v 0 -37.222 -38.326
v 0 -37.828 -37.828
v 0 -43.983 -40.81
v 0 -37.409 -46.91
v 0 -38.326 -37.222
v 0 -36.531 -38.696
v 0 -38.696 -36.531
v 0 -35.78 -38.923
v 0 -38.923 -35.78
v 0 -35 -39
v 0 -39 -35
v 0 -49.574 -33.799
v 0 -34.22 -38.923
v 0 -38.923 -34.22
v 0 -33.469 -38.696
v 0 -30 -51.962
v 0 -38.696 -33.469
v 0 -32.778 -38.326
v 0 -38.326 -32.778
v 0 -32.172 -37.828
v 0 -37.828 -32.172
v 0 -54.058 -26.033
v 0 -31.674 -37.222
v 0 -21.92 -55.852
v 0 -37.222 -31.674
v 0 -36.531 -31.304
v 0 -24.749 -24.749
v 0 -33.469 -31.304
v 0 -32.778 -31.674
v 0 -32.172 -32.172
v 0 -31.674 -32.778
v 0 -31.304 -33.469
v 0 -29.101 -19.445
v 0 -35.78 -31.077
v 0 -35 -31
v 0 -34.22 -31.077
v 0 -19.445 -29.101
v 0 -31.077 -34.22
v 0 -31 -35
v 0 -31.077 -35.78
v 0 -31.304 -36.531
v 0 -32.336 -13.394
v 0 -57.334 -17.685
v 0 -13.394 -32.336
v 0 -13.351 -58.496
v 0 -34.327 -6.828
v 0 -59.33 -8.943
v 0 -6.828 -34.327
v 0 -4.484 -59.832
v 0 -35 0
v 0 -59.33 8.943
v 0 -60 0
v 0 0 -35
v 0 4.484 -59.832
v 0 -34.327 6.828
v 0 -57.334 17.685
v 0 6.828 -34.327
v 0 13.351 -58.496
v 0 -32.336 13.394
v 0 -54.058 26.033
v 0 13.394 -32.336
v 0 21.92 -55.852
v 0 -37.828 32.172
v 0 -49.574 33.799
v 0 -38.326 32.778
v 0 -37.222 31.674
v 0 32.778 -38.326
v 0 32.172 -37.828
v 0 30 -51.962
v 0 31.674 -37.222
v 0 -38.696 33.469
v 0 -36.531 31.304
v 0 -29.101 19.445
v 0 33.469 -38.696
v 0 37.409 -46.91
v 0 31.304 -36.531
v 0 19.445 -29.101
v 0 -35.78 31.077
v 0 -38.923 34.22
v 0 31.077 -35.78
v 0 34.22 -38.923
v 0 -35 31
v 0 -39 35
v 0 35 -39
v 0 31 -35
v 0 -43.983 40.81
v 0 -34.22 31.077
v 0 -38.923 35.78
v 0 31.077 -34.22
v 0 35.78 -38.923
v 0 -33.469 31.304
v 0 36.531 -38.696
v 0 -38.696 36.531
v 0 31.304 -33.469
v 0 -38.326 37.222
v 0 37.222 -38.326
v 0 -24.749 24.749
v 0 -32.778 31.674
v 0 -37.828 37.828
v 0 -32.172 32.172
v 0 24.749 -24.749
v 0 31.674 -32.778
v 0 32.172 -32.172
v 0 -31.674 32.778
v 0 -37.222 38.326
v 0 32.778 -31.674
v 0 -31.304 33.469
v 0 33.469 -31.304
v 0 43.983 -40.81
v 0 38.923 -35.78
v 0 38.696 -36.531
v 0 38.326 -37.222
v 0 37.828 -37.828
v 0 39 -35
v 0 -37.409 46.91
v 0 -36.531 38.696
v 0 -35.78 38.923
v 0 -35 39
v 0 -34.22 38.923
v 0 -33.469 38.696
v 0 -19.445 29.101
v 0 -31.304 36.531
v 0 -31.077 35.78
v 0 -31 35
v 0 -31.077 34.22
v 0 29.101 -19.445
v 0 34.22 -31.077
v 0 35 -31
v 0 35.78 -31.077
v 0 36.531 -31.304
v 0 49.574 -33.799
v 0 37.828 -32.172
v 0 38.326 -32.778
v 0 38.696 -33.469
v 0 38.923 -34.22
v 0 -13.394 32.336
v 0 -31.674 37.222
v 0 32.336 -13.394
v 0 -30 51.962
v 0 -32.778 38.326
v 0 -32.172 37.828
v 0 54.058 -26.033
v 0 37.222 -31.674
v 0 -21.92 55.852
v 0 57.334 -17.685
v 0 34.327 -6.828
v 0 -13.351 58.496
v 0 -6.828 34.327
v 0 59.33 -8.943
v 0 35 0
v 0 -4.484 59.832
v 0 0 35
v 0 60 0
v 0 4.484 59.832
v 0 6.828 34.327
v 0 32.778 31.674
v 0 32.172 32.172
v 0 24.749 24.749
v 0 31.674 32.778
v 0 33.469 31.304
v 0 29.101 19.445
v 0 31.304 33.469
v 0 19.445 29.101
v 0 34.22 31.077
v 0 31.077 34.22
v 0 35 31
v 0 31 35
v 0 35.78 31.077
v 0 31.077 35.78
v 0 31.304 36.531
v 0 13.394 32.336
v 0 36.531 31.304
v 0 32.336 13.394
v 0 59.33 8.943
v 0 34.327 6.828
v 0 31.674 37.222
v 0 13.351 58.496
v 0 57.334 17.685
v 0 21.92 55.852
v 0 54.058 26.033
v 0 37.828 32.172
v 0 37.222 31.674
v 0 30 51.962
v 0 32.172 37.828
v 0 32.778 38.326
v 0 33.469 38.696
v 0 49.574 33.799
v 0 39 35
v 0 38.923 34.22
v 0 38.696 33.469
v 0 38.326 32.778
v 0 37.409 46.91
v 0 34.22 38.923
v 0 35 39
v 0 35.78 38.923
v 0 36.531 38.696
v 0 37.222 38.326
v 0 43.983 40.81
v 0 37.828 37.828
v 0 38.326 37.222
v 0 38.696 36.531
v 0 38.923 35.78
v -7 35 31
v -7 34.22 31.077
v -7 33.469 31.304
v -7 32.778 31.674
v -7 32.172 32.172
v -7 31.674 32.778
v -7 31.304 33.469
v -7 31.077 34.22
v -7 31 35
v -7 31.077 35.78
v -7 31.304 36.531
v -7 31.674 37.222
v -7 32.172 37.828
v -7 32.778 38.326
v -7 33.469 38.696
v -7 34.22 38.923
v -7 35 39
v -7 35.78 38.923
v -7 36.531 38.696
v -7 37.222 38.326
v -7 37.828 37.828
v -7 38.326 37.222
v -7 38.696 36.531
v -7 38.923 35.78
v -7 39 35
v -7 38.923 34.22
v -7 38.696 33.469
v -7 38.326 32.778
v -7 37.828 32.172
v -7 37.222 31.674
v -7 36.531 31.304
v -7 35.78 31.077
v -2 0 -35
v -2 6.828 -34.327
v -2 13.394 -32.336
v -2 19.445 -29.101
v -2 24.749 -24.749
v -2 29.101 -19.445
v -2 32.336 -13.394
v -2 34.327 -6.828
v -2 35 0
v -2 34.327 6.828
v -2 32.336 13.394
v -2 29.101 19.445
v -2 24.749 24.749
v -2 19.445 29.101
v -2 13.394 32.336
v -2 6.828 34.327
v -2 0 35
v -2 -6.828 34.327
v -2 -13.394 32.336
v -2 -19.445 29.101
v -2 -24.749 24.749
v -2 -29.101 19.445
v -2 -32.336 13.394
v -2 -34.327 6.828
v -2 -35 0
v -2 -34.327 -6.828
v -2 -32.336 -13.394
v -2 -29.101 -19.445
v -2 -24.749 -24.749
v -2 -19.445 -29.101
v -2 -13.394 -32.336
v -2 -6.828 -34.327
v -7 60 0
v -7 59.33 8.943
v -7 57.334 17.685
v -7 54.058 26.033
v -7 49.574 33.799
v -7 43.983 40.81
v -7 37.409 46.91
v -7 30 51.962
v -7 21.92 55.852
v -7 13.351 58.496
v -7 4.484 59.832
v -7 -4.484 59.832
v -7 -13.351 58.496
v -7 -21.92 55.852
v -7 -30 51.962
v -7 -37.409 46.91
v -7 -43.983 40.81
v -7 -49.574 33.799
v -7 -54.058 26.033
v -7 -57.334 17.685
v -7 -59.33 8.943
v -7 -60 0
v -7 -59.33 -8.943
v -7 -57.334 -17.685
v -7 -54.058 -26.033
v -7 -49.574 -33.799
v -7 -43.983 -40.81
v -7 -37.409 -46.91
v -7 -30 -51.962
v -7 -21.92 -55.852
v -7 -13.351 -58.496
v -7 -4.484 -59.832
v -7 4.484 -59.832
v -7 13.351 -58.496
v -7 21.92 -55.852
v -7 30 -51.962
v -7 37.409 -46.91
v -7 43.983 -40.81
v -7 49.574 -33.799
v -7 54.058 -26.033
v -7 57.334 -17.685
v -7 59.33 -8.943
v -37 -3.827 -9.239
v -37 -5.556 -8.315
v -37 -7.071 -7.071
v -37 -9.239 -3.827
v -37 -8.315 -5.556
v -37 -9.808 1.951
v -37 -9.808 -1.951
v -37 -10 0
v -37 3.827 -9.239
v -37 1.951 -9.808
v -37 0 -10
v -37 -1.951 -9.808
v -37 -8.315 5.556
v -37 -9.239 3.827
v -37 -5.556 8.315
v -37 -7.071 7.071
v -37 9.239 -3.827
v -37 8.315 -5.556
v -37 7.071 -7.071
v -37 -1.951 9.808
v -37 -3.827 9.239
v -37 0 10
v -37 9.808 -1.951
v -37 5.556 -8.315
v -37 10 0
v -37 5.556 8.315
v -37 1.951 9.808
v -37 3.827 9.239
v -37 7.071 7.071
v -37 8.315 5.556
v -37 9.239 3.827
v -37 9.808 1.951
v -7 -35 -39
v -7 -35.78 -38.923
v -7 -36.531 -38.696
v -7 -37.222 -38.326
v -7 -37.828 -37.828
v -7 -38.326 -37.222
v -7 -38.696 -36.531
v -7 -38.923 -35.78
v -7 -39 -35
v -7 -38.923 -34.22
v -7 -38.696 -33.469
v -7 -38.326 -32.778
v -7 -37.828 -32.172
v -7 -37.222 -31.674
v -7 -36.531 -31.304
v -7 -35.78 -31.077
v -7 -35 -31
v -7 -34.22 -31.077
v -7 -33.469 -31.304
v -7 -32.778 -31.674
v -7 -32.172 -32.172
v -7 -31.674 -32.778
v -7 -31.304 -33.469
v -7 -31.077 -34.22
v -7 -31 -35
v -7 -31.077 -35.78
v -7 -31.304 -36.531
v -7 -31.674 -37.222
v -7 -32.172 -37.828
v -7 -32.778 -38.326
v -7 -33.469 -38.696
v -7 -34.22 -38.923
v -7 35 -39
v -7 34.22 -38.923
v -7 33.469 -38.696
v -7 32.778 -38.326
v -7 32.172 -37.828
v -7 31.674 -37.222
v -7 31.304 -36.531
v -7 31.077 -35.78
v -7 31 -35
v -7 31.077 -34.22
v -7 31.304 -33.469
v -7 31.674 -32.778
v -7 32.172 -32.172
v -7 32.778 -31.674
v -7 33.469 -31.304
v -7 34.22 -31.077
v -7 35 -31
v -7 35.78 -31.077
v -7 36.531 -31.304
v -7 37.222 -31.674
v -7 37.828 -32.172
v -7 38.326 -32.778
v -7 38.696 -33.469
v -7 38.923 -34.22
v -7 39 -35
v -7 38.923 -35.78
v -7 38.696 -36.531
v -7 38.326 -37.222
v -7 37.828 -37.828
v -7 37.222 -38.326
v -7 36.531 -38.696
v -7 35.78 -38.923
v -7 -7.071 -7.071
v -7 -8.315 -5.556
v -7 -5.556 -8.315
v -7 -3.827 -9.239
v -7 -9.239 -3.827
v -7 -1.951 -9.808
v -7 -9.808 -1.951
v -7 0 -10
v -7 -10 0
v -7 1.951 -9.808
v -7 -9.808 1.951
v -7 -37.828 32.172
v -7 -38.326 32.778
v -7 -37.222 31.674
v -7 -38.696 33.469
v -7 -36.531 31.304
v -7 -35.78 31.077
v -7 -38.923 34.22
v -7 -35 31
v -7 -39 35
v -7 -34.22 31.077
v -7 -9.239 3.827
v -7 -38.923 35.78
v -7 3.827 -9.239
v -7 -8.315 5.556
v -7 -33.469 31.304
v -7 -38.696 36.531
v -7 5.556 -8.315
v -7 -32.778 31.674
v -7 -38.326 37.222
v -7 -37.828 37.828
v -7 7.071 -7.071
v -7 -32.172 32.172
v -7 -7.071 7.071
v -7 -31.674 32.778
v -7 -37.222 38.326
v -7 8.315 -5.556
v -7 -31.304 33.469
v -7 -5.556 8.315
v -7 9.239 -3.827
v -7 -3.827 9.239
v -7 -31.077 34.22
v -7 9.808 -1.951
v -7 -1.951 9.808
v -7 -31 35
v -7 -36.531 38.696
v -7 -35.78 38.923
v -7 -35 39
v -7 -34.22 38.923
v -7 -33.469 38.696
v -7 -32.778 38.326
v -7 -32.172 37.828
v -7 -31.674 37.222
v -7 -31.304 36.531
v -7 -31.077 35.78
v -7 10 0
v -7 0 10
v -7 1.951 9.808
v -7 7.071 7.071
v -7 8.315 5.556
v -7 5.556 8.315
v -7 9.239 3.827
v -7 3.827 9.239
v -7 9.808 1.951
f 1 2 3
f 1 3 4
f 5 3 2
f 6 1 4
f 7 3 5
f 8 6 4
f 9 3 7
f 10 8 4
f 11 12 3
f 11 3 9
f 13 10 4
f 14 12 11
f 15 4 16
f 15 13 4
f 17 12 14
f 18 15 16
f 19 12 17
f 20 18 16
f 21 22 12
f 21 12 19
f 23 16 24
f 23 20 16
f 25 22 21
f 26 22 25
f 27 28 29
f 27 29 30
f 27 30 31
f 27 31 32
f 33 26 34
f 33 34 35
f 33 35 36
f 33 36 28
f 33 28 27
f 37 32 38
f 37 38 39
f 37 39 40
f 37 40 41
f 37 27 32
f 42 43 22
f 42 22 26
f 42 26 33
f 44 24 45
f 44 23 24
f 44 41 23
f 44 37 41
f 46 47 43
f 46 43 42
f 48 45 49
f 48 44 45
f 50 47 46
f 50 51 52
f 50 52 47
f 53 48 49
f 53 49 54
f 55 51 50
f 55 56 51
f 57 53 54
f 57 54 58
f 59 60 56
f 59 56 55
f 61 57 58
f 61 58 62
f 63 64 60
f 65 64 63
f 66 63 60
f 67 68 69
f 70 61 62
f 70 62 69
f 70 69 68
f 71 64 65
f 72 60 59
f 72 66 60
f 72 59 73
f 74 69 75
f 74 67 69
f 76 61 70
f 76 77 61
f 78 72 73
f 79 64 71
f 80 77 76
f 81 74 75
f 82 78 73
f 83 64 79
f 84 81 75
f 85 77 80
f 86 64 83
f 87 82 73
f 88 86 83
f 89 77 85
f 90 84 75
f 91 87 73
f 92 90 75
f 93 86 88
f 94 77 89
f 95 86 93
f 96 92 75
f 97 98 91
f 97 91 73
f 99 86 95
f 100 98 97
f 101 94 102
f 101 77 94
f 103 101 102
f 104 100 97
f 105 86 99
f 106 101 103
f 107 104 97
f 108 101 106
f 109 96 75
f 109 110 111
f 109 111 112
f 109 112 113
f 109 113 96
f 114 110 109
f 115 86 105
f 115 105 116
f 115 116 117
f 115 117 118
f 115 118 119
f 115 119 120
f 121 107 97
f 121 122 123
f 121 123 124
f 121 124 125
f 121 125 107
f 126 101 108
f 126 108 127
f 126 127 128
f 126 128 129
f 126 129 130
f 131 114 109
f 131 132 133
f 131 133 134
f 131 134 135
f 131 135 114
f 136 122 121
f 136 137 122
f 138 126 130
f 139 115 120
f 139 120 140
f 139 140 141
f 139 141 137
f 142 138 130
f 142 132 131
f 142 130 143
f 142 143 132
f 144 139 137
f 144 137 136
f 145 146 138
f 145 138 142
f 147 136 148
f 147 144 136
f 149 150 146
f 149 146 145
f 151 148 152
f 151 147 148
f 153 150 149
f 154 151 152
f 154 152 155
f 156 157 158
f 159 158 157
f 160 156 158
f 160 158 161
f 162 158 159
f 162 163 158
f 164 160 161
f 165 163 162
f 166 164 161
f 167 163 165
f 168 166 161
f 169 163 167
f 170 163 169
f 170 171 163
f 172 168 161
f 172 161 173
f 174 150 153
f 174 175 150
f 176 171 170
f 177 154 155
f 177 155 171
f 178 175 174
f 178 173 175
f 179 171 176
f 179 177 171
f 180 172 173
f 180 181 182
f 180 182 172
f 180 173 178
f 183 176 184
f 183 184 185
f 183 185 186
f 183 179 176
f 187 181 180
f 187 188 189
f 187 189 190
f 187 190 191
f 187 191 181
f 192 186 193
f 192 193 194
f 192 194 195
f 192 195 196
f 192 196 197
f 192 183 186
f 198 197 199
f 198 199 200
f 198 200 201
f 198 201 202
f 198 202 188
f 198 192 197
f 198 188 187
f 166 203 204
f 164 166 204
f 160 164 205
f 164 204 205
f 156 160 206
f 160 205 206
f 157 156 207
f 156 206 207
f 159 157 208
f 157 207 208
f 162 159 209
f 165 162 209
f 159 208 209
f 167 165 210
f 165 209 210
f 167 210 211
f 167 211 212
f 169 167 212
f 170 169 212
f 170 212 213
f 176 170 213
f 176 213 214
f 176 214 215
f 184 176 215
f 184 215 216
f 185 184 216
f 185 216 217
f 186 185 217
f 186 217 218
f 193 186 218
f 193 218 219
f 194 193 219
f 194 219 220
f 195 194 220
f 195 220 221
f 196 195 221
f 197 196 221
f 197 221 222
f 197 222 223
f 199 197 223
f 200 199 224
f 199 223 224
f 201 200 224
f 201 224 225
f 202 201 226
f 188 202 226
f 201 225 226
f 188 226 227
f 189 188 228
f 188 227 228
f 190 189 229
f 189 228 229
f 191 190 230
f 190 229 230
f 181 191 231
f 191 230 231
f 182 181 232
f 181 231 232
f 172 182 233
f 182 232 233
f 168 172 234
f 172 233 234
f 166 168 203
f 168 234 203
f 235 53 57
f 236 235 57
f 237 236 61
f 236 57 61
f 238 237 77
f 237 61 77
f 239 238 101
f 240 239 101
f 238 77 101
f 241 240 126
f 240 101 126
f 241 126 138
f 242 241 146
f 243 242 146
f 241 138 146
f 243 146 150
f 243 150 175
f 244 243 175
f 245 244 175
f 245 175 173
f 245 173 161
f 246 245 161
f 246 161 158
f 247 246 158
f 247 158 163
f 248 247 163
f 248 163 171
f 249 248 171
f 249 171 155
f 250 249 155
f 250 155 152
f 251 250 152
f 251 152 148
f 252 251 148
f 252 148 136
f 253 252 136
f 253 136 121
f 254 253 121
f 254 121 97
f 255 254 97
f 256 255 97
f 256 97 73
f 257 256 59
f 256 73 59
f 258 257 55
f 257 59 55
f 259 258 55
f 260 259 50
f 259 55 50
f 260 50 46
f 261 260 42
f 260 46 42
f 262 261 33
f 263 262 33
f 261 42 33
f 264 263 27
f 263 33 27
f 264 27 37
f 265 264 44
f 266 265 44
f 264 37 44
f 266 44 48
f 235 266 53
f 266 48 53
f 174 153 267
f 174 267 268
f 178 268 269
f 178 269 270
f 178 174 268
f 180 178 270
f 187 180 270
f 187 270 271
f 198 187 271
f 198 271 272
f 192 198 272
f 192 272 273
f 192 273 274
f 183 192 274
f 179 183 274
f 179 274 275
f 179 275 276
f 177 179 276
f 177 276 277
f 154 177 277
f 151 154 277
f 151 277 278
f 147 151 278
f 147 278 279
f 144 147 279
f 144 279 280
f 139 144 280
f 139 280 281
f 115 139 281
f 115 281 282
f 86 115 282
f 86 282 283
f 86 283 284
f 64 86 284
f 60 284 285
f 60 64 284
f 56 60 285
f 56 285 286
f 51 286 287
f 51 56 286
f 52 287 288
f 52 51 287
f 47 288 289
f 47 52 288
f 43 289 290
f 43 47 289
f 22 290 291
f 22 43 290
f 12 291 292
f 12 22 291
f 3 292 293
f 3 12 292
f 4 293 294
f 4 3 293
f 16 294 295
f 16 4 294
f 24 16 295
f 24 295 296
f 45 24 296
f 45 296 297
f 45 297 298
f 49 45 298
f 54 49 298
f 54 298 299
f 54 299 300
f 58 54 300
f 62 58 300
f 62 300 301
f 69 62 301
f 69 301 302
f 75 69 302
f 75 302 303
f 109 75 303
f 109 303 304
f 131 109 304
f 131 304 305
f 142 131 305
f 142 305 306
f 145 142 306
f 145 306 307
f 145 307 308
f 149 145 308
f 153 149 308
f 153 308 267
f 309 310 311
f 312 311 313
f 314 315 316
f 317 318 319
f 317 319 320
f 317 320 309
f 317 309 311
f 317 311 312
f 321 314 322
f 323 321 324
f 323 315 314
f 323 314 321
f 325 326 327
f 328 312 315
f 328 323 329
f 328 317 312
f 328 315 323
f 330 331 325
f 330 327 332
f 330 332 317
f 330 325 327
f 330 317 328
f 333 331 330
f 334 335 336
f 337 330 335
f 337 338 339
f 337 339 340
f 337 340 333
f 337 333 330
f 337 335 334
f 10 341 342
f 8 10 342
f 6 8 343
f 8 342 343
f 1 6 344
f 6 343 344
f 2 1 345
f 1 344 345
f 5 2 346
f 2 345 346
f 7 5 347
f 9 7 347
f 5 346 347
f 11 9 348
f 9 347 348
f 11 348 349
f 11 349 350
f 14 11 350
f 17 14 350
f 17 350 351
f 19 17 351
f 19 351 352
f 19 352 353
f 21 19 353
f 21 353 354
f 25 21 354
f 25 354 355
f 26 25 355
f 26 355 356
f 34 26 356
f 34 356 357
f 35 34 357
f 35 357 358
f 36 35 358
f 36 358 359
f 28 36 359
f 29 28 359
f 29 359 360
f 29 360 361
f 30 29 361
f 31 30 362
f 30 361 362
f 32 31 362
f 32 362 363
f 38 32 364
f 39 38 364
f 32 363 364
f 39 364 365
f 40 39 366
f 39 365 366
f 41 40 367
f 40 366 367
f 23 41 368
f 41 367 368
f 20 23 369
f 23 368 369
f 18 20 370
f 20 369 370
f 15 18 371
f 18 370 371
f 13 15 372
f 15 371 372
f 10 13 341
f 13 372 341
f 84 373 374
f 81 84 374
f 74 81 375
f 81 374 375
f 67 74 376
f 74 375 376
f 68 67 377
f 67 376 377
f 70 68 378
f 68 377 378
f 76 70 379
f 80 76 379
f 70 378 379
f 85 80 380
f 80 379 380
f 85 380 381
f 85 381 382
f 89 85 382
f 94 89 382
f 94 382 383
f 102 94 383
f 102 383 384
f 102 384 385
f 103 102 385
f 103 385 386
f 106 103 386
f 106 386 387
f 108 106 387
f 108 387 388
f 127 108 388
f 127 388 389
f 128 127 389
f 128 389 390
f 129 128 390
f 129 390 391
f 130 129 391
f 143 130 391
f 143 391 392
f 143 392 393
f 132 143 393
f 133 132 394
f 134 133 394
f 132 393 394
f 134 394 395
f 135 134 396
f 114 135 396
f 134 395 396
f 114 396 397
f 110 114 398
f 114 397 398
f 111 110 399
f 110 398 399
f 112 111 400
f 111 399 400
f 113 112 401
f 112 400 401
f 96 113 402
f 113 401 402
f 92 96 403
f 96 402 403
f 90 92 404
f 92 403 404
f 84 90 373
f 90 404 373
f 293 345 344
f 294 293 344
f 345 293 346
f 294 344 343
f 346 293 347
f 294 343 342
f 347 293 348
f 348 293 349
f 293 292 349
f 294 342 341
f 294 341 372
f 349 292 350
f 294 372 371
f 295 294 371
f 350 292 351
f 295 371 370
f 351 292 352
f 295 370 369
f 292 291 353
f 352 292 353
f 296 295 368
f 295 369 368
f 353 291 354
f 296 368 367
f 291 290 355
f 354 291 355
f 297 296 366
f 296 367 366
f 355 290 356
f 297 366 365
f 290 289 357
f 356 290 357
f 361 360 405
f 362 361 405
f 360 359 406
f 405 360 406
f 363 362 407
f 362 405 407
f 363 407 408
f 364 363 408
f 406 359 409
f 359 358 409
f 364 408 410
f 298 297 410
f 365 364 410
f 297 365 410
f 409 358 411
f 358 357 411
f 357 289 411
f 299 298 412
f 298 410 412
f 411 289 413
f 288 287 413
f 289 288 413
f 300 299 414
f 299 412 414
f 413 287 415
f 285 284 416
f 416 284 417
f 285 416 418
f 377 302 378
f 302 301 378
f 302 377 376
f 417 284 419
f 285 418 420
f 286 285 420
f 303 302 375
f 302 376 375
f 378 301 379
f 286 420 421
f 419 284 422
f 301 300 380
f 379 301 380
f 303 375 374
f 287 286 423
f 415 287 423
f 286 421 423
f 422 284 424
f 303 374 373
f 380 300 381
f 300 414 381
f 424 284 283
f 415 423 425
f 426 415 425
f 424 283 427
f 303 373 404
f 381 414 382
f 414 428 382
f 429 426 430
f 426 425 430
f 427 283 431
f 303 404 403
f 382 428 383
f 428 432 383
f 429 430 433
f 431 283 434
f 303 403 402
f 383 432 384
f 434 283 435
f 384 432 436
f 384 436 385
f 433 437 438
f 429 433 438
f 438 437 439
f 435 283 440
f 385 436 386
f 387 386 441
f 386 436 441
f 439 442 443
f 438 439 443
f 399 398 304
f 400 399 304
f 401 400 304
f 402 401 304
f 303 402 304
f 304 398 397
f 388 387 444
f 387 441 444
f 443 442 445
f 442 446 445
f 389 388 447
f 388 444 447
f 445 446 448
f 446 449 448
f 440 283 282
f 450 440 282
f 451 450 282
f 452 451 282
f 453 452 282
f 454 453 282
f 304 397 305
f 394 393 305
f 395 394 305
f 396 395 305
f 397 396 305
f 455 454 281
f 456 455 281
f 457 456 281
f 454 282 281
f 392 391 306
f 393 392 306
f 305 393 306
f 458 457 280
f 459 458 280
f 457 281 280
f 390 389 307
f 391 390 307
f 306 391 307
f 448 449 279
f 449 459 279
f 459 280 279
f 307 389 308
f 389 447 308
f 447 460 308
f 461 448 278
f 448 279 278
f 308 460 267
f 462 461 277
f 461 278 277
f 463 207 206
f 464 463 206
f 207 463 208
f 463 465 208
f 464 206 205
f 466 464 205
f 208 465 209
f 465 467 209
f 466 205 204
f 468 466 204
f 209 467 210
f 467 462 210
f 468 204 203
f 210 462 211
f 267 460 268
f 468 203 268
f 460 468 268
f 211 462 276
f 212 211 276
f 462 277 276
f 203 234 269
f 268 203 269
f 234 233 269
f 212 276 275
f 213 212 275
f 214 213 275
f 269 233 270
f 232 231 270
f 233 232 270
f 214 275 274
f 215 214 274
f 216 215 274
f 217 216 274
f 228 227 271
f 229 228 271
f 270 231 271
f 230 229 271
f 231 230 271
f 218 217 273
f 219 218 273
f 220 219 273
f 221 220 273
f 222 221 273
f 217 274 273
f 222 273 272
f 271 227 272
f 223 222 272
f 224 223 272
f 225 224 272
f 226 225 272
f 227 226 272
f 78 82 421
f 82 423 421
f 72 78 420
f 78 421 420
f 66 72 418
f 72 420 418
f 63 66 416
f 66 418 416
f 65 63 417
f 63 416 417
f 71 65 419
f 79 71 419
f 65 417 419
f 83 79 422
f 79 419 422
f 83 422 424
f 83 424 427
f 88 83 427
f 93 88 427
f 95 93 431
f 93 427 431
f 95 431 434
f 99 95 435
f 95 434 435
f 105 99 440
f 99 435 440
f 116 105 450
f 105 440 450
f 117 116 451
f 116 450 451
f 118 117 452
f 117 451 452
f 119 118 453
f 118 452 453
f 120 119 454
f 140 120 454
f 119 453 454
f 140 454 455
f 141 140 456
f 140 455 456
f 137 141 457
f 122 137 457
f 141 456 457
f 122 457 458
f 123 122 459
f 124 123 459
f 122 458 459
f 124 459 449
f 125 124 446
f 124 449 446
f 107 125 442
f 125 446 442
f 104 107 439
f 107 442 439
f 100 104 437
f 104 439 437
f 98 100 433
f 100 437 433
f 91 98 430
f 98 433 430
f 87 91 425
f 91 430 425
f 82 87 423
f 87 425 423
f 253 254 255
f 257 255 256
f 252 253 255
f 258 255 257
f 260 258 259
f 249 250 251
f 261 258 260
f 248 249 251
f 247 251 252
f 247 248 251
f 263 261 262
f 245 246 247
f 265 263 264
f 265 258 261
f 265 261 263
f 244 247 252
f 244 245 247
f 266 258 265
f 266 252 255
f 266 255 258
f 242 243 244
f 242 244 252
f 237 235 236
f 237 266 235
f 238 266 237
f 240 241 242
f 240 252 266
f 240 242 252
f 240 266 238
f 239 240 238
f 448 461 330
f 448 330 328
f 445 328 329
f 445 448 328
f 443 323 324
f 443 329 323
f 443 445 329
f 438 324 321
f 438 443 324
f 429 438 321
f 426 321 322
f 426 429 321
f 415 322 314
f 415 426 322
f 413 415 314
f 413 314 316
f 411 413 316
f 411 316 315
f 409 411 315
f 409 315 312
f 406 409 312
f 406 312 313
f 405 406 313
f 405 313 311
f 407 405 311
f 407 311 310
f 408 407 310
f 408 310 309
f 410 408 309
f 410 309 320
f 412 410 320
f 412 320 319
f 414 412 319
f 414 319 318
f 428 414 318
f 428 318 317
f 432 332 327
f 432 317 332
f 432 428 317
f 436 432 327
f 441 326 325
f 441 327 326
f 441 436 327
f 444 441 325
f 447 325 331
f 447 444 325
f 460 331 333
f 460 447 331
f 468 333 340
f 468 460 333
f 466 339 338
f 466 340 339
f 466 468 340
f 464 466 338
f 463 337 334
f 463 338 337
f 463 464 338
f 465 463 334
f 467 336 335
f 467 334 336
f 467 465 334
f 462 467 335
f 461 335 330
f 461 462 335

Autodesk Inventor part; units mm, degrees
ref_plane "YZ Plane" through (0, 0, 0) normal (1, 0, 0) x (0, 1, 0)
ref_plane "XZ Plane" through (0, 0, 0) normal (0, 1, 0) x (-1, 0, 0)
ref_plane "XY Plane" through (0, 0, 0) normal (0, 0, 1) x (1, 0, 0)
sketch "Sketch1" plane through (0, 0, 0) normal (1, 0, 0) x (0, 1, 0)
  circle A0 centre (0, 0) radius 60
  line L0 (0, 84) -> (0, -84) construction
  line L1 (-84, 0) -> (84, 0) construction
  dimension "d0" = 120
extrude "Flange" add sketch "Sketch1" against normal blind 7
sketch "Sketch2" plane through (0, 0, 0) normal (1, 0, 0) x (0, 0, -1)
  line L0 (-84, 0) -> (84, 0) construction
  line L1 (0, -84) -> (0, 84) construction
  point P0 (0, 0)
  point P1 (-35, 35)
  point P2 (35, 35)
  point P3 (35, -35)
  point P4 (-35, -35)
  dimension "d5" = 70
  dimension "d6" = 70
hole "Bolt Holes" at (0, 35, 35) at (0, 35, -35) at (0, -35, -35) at (0, -35, 35) direction (-1, 0, 0) diameter 8 end through all
sketch "Sketch3" plane through (-7, 0, 0) normal (-1, 0, 0) x (0, 0, 1)
  circle A0 centre (0, 0) radius 10
  dimension "d14" = 20
extrude "CV Input" add sketch "Sketch3" along normal blind 30
sketch "Sketch4" plane through (0, 0, 0) normal (1, 0, 0) x (0, 0, -1)
  circle A0 centre (0, 0) radius 35
  dimension "d20" = 70
extrude "Extrusion3" cut sketch "Sketch4" against normal blind 2
properties part number "Diff_CV_Output_V1"
